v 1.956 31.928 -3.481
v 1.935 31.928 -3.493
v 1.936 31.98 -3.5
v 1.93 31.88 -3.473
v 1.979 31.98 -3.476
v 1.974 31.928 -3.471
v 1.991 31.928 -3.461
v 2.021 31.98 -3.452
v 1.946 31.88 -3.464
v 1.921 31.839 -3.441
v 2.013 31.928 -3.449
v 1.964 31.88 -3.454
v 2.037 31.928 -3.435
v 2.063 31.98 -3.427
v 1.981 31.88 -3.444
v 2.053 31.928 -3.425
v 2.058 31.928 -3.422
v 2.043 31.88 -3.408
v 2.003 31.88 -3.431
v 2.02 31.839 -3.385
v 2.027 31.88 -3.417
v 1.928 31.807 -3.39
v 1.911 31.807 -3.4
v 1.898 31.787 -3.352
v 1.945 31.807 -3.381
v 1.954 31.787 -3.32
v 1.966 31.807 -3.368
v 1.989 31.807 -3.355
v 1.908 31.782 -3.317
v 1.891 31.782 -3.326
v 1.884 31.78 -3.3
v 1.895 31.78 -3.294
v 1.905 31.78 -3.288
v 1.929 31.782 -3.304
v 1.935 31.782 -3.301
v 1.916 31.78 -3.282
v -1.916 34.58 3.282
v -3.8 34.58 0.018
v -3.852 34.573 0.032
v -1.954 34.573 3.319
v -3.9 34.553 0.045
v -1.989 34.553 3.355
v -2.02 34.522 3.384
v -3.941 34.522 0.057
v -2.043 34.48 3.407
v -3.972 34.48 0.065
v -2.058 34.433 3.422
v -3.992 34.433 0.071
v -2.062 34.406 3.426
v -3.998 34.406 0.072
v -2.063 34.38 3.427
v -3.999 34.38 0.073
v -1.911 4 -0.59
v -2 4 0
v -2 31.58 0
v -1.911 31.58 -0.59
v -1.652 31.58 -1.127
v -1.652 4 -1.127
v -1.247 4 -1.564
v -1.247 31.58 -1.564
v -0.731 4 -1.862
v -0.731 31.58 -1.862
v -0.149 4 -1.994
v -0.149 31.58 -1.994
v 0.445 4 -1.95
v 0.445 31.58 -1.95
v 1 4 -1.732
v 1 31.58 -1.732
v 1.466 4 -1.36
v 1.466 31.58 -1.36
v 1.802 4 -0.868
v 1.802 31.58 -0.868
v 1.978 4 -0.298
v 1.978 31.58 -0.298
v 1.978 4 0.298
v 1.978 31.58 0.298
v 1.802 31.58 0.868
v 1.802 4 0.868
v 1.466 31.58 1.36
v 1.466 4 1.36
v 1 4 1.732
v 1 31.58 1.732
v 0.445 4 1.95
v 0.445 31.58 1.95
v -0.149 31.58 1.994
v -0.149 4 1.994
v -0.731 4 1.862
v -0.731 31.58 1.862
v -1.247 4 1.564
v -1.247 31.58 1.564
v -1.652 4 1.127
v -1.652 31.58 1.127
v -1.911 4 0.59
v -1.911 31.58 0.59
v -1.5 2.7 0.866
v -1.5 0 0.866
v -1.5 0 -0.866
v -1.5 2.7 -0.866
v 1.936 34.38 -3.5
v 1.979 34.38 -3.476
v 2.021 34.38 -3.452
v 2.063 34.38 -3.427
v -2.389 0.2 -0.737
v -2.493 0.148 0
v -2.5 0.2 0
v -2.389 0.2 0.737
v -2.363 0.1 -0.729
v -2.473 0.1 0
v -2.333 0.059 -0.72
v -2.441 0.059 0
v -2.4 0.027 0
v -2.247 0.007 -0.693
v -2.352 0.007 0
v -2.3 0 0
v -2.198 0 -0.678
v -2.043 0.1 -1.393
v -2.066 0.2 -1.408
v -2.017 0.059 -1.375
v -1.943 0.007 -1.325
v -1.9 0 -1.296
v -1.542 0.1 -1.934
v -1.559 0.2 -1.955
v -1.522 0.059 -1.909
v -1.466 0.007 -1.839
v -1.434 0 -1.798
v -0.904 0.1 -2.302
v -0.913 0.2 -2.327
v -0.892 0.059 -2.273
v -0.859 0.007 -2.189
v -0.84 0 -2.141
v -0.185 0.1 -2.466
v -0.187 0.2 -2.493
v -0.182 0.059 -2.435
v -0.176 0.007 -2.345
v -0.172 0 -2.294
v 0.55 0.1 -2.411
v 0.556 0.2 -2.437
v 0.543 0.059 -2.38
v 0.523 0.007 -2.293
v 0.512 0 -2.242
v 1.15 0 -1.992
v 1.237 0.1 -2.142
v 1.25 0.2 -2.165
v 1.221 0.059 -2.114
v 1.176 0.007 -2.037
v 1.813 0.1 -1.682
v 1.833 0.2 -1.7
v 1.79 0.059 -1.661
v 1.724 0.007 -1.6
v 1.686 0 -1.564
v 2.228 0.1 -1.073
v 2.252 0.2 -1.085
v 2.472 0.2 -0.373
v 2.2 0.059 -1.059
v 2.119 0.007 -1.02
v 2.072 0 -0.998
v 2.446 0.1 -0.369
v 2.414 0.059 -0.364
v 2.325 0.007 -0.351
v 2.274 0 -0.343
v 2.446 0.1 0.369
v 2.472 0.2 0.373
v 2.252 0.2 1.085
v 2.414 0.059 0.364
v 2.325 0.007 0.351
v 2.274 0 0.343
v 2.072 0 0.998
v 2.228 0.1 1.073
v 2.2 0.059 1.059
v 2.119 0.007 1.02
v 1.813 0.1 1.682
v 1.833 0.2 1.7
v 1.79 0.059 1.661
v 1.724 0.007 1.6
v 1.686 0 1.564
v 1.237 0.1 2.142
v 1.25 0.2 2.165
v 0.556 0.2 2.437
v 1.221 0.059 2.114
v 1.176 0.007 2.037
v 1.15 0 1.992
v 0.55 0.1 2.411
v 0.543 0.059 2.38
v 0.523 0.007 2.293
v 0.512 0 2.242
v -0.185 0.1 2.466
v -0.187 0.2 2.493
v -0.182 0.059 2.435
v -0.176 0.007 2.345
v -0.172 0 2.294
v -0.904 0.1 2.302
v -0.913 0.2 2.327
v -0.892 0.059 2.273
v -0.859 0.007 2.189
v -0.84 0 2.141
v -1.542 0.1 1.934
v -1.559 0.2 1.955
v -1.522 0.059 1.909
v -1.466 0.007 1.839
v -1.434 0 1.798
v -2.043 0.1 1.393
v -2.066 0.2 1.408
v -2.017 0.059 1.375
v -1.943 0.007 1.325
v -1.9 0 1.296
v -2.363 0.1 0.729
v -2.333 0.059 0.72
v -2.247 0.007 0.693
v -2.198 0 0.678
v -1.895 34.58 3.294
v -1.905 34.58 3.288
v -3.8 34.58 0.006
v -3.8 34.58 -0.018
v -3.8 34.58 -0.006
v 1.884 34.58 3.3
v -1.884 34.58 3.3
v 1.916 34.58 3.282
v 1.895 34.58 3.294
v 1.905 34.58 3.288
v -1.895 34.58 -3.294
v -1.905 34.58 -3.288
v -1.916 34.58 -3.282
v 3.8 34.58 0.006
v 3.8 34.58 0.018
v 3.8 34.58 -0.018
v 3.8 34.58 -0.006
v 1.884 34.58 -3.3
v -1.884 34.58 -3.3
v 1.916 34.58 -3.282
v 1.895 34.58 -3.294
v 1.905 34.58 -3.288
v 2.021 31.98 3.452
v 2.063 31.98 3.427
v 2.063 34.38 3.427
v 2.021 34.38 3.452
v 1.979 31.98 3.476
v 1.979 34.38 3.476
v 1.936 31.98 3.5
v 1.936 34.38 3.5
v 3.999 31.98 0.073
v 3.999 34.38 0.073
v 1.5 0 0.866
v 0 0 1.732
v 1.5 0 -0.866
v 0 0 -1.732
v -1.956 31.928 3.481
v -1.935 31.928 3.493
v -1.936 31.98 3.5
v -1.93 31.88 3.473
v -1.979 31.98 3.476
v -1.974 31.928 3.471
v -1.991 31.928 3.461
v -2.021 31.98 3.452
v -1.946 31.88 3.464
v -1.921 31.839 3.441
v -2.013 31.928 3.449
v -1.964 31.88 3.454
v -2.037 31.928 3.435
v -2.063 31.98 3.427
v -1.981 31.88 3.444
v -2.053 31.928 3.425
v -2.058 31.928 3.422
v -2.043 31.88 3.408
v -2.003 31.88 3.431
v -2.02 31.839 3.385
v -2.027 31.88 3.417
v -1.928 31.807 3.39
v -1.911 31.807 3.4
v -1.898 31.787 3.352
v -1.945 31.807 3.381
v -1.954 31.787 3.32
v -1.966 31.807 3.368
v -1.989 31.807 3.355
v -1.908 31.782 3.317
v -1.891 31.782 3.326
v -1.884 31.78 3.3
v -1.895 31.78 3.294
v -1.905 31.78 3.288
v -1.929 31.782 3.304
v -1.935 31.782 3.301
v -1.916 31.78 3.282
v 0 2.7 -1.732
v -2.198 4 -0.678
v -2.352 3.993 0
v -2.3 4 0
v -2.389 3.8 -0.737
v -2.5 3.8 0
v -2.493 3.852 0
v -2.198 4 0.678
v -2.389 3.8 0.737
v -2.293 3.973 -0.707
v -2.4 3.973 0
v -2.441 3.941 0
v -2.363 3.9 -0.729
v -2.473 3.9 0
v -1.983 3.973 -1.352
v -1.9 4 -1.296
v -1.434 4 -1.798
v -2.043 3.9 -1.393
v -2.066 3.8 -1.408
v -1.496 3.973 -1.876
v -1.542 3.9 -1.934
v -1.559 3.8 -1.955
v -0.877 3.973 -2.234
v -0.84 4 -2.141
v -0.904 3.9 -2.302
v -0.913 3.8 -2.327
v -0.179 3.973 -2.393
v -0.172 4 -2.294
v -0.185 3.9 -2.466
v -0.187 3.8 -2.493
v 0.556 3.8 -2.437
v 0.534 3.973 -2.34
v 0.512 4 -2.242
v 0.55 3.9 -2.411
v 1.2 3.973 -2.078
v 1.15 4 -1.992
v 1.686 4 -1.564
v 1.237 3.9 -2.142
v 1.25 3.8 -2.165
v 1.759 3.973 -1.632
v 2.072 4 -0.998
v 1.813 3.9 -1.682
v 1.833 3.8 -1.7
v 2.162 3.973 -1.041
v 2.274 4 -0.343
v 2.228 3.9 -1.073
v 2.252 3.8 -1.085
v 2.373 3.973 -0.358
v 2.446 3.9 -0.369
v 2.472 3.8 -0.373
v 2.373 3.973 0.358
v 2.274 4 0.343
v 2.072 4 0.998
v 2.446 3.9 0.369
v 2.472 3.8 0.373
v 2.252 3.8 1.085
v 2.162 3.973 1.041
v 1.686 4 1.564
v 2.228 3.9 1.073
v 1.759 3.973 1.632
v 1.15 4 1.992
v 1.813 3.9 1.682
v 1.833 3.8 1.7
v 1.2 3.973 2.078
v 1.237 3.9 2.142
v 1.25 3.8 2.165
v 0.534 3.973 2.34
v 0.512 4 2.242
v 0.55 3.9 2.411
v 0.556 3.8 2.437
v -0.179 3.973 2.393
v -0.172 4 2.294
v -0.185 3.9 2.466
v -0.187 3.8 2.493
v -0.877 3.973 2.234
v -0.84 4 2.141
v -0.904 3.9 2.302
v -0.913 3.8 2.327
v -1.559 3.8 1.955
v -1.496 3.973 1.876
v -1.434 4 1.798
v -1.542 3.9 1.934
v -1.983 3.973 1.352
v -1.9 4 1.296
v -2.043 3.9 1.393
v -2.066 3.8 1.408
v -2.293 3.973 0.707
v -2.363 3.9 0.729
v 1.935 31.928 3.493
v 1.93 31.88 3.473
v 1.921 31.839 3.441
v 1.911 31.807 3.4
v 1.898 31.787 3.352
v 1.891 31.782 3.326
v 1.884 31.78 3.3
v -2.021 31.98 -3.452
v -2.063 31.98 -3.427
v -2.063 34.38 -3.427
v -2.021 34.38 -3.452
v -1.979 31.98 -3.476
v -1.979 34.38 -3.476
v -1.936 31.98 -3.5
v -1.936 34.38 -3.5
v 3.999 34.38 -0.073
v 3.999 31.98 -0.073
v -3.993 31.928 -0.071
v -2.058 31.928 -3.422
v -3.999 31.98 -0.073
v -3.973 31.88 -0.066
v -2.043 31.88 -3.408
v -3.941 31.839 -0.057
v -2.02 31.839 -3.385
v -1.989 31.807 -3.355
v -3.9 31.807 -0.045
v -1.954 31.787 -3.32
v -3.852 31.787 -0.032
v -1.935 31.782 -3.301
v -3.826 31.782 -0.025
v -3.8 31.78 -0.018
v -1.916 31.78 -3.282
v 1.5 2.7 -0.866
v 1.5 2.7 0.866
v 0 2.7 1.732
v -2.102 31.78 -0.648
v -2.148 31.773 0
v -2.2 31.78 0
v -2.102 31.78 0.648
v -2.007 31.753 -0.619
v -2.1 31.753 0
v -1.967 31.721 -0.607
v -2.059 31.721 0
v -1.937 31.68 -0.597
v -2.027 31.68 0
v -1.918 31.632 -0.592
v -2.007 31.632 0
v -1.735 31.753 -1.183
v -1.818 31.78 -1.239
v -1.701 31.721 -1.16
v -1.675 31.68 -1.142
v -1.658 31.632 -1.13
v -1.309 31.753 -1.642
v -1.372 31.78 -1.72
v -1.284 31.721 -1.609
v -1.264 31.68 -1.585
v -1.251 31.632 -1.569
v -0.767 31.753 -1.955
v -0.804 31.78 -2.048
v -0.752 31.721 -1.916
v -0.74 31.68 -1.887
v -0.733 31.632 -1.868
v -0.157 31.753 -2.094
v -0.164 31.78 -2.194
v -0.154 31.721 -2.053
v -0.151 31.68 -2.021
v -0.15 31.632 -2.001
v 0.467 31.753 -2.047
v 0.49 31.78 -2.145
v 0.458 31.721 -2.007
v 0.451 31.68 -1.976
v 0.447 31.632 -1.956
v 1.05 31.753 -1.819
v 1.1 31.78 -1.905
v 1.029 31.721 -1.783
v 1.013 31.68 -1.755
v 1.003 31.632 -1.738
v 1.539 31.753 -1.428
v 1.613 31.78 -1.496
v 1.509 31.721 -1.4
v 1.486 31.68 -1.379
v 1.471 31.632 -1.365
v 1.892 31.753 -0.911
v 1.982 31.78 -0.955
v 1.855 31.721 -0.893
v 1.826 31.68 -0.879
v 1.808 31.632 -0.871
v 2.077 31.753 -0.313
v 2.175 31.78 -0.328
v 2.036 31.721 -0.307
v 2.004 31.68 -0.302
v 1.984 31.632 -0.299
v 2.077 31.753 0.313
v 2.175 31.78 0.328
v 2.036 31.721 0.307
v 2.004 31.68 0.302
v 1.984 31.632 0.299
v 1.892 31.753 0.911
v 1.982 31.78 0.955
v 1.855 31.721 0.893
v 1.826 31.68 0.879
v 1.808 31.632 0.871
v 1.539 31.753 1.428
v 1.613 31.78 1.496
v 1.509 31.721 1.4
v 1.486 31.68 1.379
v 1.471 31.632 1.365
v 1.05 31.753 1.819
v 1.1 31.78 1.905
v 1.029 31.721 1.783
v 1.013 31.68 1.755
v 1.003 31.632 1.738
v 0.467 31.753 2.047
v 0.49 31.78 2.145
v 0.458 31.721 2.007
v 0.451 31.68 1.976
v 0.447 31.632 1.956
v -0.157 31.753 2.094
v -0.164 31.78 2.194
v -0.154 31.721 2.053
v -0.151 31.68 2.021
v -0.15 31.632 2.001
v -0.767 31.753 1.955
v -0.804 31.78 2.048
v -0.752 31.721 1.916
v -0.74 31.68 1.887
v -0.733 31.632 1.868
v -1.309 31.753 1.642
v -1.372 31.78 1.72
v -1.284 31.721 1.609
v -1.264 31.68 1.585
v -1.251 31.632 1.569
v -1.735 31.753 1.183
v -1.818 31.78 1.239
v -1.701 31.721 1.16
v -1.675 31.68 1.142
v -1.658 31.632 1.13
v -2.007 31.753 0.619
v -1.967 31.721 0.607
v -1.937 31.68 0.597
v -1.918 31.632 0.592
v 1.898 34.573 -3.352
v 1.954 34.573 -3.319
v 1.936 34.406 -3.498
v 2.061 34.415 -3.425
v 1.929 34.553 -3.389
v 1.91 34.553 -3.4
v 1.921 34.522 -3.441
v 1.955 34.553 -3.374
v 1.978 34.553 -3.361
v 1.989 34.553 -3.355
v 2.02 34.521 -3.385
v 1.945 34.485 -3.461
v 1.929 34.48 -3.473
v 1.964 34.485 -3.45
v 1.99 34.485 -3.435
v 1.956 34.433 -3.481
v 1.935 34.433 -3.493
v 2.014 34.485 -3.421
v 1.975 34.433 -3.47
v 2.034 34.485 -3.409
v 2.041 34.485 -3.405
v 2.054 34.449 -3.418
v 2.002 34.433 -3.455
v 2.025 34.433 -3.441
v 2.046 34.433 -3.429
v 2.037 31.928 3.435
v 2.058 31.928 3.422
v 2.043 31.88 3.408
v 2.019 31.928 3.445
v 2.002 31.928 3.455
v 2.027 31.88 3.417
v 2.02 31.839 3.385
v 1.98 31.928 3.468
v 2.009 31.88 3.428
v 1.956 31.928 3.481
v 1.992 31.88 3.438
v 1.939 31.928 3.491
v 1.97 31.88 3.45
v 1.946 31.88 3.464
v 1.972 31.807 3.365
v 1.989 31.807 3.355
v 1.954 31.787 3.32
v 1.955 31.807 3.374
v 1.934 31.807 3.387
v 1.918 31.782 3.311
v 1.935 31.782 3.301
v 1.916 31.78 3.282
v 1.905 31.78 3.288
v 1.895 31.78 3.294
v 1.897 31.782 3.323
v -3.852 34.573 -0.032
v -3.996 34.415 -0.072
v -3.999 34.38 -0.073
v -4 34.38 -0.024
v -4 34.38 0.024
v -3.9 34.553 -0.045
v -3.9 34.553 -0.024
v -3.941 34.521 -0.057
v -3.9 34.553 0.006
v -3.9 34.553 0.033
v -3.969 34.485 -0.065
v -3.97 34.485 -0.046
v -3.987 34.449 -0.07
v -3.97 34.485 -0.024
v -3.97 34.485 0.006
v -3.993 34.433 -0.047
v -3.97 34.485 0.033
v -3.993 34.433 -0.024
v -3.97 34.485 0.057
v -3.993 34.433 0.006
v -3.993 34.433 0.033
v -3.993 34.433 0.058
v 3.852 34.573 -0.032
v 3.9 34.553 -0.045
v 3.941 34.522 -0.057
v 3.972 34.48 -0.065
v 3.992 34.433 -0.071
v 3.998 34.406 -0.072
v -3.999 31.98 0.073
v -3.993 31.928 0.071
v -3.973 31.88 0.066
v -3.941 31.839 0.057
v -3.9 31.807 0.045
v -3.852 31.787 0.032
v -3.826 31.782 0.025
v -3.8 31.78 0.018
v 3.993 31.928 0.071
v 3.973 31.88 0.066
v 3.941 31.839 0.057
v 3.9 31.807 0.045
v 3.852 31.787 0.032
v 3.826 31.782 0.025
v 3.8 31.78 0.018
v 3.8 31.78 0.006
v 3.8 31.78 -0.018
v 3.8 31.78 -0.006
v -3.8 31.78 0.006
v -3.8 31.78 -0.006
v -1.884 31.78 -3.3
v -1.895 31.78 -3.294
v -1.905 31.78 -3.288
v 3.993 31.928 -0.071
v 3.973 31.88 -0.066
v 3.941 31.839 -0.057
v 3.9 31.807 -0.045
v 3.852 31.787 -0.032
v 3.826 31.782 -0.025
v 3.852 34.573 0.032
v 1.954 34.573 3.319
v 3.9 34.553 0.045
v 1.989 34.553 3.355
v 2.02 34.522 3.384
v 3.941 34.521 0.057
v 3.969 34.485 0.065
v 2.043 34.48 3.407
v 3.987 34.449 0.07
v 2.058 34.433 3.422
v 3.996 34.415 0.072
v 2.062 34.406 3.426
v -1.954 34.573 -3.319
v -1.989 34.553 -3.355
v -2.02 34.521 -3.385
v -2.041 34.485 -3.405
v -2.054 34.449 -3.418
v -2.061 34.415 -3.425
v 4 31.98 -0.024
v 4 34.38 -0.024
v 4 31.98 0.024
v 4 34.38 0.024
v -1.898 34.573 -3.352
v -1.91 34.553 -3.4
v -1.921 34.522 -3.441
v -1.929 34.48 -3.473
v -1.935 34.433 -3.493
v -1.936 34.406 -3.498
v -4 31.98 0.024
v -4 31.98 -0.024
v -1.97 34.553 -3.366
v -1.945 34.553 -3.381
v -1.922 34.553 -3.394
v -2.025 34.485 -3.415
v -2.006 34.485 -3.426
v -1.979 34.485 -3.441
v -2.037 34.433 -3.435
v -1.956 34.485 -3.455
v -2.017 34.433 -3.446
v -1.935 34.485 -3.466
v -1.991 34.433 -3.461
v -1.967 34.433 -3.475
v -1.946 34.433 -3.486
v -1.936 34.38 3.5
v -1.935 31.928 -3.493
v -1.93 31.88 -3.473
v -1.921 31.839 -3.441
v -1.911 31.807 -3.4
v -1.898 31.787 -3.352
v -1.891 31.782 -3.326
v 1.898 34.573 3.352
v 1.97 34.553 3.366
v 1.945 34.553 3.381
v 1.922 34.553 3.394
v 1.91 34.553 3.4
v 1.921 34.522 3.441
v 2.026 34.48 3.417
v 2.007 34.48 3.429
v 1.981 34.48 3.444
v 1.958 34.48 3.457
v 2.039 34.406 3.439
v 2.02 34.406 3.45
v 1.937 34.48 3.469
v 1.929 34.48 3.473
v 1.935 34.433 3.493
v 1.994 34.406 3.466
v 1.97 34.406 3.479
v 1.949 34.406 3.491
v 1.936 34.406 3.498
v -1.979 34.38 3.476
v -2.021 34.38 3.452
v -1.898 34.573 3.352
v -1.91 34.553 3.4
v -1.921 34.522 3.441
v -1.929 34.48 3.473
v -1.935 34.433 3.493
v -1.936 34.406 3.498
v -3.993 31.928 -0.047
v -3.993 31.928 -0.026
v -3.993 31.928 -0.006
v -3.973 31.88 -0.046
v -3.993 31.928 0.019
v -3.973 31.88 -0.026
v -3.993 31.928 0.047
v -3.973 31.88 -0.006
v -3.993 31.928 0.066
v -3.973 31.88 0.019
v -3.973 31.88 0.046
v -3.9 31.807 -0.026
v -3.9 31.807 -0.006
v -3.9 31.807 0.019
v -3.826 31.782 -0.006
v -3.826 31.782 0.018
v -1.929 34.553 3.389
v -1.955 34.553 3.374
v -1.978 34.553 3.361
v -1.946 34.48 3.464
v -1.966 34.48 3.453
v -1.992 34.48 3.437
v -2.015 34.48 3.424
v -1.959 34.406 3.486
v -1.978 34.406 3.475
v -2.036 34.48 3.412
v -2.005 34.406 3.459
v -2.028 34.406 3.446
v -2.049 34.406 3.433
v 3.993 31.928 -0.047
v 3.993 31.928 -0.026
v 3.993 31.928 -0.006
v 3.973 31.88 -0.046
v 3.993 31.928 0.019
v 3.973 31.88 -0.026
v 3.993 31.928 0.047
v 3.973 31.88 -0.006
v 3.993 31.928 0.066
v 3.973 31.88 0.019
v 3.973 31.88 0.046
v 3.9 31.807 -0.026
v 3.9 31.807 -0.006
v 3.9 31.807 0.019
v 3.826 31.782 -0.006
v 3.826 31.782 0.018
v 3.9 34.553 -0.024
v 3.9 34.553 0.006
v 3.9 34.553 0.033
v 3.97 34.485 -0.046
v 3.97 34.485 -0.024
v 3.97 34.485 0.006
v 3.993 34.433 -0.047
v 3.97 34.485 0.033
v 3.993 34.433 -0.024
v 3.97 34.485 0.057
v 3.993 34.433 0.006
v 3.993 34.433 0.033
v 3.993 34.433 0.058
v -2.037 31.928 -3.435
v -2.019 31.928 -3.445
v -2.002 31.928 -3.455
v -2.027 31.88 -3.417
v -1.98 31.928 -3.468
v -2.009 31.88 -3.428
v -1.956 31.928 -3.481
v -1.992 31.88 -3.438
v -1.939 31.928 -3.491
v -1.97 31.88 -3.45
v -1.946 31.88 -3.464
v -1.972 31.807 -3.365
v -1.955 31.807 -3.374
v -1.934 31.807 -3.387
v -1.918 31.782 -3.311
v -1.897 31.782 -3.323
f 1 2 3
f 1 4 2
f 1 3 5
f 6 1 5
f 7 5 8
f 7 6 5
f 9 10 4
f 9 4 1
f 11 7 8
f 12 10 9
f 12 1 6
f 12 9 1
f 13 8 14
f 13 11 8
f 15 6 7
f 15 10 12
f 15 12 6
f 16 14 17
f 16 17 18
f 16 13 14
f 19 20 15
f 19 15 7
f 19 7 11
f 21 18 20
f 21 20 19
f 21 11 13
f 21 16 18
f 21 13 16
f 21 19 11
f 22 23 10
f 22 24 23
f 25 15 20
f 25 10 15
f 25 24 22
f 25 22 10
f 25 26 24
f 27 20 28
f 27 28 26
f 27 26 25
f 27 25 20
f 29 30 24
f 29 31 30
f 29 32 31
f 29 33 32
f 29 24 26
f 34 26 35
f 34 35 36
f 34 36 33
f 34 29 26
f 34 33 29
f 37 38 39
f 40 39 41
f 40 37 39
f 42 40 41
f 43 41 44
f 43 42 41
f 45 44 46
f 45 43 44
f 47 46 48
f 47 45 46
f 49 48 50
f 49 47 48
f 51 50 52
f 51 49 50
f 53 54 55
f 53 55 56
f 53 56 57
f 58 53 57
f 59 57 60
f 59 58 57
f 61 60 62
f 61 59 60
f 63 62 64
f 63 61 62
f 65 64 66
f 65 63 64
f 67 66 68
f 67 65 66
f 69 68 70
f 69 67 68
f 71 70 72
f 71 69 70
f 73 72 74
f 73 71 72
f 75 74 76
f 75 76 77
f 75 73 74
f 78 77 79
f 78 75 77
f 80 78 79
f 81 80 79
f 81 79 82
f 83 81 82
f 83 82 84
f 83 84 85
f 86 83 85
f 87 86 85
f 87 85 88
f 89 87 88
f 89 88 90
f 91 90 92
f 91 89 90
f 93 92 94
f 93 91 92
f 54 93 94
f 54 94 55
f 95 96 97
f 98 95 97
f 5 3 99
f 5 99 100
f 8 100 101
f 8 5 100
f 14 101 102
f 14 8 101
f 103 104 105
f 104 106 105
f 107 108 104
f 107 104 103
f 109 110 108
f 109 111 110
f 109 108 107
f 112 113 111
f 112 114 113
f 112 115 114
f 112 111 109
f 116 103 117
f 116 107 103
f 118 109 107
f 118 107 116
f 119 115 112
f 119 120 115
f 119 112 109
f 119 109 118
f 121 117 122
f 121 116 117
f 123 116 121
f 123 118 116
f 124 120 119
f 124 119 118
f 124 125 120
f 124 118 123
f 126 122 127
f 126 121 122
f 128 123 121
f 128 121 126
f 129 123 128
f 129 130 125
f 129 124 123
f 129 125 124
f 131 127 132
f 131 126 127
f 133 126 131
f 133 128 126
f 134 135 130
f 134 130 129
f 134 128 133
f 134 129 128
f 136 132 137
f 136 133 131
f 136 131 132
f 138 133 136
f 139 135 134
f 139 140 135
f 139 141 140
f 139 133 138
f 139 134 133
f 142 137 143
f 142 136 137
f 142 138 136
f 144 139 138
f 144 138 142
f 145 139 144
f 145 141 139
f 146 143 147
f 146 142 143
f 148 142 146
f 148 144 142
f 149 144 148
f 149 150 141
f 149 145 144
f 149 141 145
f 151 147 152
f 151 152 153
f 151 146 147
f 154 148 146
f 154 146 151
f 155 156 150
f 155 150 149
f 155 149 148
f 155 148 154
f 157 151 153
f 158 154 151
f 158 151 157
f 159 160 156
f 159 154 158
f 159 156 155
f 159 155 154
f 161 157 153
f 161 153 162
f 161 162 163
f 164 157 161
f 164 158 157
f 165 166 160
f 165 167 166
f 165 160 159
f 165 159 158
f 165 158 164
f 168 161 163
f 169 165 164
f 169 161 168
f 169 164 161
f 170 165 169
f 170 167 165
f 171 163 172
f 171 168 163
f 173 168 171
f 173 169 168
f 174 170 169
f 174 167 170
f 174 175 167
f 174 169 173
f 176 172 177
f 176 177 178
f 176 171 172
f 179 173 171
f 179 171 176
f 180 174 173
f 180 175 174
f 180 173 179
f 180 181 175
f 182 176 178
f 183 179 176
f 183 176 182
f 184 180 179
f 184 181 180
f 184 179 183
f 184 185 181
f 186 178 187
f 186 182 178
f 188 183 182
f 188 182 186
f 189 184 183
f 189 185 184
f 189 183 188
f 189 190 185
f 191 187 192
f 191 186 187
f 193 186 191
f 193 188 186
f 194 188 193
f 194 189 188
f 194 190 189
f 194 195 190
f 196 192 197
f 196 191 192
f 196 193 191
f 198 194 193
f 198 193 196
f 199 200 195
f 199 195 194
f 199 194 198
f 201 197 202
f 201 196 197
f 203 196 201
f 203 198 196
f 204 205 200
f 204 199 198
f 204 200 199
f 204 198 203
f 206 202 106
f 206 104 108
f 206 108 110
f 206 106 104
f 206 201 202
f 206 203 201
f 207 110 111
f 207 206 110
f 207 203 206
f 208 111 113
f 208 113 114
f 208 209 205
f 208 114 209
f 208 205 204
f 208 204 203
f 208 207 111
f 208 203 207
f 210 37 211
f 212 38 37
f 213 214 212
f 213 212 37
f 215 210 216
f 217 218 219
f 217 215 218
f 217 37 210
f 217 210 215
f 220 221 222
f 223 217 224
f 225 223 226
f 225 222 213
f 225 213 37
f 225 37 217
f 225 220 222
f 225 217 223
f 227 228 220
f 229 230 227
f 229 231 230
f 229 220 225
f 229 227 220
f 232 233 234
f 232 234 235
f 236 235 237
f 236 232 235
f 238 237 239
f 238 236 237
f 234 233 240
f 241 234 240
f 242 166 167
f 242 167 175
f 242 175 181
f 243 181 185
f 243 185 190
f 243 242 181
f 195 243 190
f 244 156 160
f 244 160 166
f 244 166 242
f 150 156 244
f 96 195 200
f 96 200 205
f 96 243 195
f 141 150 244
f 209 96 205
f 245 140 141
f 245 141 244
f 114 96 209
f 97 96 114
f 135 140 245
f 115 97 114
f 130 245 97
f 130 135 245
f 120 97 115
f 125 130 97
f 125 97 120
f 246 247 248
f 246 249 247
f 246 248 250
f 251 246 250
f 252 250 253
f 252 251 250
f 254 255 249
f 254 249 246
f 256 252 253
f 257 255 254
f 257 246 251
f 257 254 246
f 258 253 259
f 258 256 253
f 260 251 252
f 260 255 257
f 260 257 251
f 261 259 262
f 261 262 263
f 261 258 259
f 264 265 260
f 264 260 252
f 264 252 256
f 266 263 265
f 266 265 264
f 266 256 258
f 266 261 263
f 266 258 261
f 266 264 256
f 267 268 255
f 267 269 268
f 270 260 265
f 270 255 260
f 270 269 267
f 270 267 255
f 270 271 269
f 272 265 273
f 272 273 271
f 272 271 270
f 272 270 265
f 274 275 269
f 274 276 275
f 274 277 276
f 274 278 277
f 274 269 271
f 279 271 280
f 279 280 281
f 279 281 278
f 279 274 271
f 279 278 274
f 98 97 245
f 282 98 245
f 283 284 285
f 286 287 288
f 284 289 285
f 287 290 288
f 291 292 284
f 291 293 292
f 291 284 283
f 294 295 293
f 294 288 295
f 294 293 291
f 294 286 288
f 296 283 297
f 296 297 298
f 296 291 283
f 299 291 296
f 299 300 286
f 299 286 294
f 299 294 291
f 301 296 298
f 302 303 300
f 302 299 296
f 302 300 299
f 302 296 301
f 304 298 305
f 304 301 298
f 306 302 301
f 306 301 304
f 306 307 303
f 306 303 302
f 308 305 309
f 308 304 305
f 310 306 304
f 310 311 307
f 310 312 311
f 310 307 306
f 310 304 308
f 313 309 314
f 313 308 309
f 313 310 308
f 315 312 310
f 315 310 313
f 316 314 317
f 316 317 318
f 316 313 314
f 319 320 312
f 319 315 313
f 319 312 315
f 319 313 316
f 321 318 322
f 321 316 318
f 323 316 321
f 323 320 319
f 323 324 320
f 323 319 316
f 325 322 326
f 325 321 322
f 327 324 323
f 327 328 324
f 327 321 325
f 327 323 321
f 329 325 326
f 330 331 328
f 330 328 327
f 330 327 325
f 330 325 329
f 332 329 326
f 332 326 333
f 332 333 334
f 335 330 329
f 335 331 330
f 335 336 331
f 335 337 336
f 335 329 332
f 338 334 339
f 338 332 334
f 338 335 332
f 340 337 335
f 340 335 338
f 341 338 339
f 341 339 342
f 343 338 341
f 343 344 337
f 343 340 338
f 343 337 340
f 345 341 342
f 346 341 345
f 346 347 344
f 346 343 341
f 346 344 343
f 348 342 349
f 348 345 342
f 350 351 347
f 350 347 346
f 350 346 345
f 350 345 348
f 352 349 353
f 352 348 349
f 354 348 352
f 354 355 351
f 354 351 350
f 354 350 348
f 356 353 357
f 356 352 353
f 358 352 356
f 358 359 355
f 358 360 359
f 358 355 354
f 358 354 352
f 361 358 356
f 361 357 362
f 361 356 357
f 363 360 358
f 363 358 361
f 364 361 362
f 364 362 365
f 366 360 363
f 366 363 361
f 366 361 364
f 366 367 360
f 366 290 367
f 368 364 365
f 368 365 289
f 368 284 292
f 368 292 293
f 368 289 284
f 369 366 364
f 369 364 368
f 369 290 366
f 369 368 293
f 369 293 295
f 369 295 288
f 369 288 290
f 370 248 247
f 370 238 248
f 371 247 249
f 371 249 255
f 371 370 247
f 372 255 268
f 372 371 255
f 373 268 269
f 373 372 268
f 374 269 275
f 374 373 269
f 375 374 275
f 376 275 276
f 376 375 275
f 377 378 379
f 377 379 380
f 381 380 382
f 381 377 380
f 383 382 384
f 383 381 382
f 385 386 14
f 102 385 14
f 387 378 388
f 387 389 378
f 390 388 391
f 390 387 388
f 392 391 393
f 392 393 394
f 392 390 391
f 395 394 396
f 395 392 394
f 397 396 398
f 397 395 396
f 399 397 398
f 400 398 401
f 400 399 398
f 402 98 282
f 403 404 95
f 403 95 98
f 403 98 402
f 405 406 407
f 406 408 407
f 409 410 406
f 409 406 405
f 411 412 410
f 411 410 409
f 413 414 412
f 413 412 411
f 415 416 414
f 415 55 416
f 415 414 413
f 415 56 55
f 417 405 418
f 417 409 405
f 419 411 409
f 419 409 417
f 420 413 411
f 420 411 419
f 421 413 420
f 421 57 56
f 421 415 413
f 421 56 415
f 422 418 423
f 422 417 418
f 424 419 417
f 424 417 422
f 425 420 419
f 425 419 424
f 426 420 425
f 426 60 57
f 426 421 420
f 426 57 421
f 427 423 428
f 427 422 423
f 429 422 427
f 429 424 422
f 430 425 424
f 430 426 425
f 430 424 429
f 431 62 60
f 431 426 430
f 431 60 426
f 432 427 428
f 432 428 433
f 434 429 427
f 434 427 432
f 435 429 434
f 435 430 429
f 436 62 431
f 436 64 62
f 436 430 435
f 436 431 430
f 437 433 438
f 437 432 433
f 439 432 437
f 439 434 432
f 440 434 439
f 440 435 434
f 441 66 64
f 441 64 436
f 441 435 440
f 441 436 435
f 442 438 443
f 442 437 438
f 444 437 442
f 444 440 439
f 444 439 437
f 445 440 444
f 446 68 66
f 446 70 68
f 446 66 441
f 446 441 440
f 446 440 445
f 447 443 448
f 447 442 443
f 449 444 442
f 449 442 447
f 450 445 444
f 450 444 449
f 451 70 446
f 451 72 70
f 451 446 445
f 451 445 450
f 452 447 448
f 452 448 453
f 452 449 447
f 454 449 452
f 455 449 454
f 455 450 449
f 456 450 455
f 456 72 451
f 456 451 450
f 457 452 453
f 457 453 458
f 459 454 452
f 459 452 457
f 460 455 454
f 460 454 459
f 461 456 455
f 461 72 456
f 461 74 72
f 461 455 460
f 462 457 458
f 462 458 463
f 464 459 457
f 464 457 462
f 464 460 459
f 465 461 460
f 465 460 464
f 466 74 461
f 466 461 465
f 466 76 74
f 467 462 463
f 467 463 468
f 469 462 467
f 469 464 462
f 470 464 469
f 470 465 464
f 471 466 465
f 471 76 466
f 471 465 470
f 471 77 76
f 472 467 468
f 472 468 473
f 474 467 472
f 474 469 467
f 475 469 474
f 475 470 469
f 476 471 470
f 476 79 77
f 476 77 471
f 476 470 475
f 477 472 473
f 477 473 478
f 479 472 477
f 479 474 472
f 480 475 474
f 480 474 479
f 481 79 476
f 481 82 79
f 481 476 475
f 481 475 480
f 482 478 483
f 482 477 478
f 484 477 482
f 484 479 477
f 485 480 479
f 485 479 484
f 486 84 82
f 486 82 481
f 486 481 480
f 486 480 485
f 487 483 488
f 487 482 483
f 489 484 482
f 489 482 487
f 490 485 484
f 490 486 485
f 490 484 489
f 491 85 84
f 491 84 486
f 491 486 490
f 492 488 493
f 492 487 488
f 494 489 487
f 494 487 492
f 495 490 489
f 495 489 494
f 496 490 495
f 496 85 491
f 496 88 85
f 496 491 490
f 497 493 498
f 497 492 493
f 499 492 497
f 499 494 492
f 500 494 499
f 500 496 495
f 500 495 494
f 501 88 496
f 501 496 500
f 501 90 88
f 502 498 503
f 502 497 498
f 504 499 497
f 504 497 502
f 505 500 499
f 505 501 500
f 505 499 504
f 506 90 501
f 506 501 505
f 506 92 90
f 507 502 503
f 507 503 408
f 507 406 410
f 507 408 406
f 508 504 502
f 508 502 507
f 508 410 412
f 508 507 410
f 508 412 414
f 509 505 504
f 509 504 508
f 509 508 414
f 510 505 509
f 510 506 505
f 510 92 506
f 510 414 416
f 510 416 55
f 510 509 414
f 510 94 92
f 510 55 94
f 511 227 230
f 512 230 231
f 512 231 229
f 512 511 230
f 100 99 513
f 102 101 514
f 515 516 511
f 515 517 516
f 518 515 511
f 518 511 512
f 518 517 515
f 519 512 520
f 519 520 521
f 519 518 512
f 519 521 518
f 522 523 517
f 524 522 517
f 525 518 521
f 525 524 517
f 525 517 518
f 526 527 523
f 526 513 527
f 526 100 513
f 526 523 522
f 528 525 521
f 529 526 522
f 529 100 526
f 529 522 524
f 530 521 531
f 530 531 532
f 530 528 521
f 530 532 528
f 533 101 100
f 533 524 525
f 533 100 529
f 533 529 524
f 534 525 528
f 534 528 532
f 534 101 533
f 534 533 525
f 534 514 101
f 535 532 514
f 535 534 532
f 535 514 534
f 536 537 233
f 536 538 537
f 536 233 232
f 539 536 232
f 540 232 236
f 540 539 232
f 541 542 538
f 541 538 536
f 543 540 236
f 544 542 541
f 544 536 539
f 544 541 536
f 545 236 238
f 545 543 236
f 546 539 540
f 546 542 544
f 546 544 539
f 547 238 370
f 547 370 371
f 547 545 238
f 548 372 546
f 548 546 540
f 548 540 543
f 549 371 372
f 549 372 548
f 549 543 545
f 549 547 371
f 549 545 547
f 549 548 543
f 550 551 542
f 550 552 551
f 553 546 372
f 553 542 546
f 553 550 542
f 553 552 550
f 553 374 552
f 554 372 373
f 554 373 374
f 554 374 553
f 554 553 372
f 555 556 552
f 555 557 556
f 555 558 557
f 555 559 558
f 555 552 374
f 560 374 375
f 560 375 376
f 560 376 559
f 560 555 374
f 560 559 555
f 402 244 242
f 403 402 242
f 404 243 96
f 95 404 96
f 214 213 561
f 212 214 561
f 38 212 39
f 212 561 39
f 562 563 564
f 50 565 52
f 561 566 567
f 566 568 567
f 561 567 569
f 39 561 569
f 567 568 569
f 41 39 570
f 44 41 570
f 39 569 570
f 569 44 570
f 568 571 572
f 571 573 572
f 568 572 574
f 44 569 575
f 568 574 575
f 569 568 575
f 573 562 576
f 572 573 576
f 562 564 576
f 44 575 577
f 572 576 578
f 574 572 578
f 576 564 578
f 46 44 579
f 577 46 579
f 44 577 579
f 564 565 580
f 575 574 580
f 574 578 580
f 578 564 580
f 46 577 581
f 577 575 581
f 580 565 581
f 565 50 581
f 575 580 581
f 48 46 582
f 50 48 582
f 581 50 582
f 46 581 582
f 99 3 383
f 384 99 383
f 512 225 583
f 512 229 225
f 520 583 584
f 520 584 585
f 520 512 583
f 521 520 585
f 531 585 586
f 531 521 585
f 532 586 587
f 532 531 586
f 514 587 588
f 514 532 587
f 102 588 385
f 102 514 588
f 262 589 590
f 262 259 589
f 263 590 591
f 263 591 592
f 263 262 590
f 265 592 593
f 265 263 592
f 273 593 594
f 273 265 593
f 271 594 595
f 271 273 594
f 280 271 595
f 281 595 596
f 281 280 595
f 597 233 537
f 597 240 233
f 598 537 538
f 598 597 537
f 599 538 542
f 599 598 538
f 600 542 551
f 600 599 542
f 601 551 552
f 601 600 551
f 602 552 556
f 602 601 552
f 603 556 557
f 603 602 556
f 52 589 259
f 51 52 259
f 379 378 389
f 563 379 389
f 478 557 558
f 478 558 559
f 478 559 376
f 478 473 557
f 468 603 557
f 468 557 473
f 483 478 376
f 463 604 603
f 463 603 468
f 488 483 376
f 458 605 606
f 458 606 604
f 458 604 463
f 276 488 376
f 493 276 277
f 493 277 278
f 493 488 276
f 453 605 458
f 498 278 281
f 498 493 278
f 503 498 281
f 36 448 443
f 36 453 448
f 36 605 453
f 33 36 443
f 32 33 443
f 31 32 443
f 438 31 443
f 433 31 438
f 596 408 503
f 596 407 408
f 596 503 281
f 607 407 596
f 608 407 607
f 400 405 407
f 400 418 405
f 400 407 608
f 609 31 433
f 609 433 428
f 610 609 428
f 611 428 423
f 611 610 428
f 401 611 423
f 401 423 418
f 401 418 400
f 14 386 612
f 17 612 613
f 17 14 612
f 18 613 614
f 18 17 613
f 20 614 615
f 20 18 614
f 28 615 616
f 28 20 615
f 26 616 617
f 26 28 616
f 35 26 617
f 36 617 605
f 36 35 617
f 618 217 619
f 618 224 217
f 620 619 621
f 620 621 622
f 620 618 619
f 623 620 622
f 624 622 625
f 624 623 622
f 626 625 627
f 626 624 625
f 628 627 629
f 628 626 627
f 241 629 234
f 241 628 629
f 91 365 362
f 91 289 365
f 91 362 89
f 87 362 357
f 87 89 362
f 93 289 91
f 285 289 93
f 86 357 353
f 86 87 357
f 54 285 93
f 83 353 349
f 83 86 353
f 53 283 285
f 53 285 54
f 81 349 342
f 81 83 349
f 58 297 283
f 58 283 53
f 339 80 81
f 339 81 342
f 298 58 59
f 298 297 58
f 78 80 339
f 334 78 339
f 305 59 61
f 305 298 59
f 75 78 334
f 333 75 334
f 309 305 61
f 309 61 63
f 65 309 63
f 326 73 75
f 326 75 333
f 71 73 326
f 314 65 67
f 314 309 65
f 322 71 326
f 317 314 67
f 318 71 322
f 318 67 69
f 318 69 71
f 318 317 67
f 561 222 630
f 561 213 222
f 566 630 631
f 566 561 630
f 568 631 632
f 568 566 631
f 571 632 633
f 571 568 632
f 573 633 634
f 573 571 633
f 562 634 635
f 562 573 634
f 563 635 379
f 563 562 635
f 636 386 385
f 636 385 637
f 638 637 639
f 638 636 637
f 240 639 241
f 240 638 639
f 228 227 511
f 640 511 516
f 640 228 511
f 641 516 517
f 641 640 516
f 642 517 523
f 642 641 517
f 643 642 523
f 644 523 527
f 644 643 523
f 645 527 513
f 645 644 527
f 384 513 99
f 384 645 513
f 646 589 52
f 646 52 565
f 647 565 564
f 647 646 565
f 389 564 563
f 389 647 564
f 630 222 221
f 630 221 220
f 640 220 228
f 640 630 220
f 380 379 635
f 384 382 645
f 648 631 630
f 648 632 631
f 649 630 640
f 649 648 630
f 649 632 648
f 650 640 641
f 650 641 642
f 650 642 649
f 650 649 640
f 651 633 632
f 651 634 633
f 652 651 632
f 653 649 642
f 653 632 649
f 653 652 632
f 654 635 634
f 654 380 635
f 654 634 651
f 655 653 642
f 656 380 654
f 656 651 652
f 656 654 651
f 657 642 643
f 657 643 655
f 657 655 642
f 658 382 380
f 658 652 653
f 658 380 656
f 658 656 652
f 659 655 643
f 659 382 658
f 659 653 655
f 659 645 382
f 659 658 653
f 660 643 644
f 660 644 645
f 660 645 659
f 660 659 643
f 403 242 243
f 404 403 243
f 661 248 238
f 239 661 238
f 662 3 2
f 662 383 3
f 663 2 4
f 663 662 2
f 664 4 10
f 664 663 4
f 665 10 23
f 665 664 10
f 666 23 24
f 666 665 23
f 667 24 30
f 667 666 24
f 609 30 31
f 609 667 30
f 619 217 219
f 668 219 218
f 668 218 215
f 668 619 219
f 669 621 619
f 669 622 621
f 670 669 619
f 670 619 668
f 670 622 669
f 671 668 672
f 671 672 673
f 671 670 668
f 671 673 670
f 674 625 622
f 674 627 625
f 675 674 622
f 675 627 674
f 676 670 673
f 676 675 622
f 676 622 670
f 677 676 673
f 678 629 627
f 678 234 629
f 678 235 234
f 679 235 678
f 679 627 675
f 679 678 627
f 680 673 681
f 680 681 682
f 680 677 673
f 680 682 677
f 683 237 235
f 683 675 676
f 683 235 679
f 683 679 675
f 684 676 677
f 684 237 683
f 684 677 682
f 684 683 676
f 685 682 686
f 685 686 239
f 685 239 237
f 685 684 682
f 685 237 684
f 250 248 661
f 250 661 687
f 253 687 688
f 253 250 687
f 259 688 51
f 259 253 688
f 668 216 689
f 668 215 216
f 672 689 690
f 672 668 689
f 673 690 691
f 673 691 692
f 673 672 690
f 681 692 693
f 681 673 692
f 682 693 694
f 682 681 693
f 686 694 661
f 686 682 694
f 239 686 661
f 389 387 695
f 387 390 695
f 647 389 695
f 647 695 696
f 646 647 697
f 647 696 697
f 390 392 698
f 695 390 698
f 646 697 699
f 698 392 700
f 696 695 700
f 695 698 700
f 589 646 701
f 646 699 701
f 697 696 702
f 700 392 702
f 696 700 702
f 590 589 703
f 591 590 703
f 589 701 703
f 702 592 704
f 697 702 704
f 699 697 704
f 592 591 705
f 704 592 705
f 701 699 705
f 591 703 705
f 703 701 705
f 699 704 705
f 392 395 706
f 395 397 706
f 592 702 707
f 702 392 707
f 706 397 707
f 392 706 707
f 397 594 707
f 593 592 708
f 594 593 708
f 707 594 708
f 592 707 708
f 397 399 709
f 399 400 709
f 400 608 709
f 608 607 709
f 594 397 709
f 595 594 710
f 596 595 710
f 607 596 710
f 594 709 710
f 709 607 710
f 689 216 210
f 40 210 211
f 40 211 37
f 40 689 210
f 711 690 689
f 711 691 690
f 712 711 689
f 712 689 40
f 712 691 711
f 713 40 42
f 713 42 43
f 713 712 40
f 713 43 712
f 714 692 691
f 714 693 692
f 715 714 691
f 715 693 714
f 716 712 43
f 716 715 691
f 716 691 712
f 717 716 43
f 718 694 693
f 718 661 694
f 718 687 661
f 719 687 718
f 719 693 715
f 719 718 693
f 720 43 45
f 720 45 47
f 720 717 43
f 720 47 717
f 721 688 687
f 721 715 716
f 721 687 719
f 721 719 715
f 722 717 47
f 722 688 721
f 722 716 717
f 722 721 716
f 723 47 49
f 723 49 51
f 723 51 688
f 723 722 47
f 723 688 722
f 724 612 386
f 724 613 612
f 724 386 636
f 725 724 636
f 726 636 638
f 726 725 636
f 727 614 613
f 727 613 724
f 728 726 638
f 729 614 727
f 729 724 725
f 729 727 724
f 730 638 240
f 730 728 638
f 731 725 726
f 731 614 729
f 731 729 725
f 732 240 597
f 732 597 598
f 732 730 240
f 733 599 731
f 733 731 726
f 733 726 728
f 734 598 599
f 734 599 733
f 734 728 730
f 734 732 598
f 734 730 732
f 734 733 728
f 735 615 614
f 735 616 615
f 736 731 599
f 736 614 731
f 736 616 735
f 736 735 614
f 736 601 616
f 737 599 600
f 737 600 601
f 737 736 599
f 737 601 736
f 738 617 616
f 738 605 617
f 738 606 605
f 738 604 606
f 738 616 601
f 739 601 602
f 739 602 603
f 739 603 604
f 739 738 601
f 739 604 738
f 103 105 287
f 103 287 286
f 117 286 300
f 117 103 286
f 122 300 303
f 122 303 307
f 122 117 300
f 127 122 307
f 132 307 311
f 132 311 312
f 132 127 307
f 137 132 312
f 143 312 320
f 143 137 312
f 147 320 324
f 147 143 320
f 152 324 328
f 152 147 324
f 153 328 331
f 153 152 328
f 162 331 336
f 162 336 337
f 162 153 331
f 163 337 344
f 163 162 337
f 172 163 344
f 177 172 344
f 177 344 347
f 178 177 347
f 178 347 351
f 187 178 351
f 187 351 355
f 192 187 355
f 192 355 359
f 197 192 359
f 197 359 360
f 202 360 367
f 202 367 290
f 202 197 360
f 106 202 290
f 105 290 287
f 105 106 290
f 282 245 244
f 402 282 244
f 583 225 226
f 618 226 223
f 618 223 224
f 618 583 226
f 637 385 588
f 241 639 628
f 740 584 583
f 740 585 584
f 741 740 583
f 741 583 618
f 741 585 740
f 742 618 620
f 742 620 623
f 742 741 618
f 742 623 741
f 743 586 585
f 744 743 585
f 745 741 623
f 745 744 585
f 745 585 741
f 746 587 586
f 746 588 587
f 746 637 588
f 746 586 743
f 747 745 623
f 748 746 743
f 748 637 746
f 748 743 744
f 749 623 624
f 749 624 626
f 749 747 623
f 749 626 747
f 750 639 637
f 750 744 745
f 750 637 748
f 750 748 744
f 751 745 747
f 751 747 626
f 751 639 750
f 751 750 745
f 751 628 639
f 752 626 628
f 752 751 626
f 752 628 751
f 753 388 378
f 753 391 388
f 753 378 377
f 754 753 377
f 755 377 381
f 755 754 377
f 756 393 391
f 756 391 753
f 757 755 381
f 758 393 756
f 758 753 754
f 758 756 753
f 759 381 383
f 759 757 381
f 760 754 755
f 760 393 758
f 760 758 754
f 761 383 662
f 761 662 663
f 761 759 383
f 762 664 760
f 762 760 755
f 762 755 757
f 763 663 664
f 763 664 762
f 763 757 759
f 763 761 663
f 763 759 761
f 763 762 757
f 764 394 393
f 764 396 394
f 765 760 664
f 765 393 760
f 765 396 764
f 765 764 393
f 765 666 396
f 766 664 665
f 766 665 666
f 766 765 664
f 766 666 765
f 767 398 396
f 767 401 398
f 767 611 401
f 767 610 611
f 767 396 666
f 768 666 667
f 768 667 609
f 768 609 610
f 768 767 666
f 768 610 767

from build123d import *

# Parameters (mm, degrees)
CUT_EXTRUDE2_START = -2.8
SKETCH2_R          = 4.777548175
CUT_EXTRUDE2_DEPTH = 2.8
CUT_EXTRUDE3_DEPTH = 2.7
FILLET1_R          = 0.2


with BuildPart() as part:
    # Sketch1 → Revolve1 (revolve)
    with BuildSketch(Plane.XY):
        Polygon((0, 34.58), (-4, 34.58), (-4, 31.78), (-2, 31.78), (-2, 4), (-2.5, 4), (-2.5, 0), (0, 0), align=None)
    revolve(axis=Axis((0, 37.671641791, 0), (0, -1, 0)))

    # Sketch2 → Cut-Extrude2 (cut)
    with BuildSketch(Plane(origin=(0, 34.58, 0), x_dir=(1, 0, 0), z_dir=(0, 1, 0)).offset(CUT_EXTRUDE2_START)):
        Circle(SKETCH2_R)
        Polygon((-4.041451884, 0), (-2.020725942, -3.5), (2.020725942, -3.5), (4.041451884, 0), (2.020725942, 3.5), (-2.020725942, 3.5), align=None, mode=Mode.SUBTRACT)
    extrude(amount=CUT_EXTRUDE2_DEPTH, mode=Mode.SUBTRACT)

    # Sketch3 → Cut-Extrude3 (cut)
    with BuildSketch(Plane.XZ):
        Polygon((0, 1.732050808), (-1.5, 0.866025404), (-1.5, -0.866025404), (0, -1.732050808), (1.5, -0.866025404), (1.5, 0.866025404), align=None)
    extrude(amount=-CUT_EXTRUDE3_DEPTH, mode=Mode.SUBTRACT)

    # Fillet1
    fillet1_edges = [part.edges().sort_by_distance(p)[0] for p in [
        (4, 31.78, 0),
        (2, 31.78, -3.464101615),
        (-2, 31.78, -3.464101615),
        (-4, 31.78, 0),
        (-2, 31.78, 3.464101615),
        (4, 34.58, 0),
        (2, 34.58, -3.464101615),
        (-2, 34.58, -3.464101615),
        (-4, 34.58, 0),
        (-2, 34.58, 3.464101615),
        (3.031088913, 34.58, -1.75),
        (3.031088913, 34.58, 1.75),
        (0, 34.58, 3.5),
        (-3.031088913, 34.58, 1.75),
        (-3.031088913, 34.58, -1.75),
        (0, 34.58, -3.5),
        (-3.031088913, 31.78, -1.75),
        (-3.031088913, 31.78, 1.75),
        (0, 31.78, 3.5),
        (3.031088913, 31.78, 1.75),
        (3.031088913, 31.78, -1.75),
        (0, 31.78, -3.5),
        (2.5, 0, 0),
        (2.5, 4, 0),
        (2, 31.78, 0),
        (2, 31.78, 3.464101615),
        (2, 34.58, 3.464101615),
    ]]
    fillet(fillet1_edges, radius=FILLET1_R)


solid = part.part
